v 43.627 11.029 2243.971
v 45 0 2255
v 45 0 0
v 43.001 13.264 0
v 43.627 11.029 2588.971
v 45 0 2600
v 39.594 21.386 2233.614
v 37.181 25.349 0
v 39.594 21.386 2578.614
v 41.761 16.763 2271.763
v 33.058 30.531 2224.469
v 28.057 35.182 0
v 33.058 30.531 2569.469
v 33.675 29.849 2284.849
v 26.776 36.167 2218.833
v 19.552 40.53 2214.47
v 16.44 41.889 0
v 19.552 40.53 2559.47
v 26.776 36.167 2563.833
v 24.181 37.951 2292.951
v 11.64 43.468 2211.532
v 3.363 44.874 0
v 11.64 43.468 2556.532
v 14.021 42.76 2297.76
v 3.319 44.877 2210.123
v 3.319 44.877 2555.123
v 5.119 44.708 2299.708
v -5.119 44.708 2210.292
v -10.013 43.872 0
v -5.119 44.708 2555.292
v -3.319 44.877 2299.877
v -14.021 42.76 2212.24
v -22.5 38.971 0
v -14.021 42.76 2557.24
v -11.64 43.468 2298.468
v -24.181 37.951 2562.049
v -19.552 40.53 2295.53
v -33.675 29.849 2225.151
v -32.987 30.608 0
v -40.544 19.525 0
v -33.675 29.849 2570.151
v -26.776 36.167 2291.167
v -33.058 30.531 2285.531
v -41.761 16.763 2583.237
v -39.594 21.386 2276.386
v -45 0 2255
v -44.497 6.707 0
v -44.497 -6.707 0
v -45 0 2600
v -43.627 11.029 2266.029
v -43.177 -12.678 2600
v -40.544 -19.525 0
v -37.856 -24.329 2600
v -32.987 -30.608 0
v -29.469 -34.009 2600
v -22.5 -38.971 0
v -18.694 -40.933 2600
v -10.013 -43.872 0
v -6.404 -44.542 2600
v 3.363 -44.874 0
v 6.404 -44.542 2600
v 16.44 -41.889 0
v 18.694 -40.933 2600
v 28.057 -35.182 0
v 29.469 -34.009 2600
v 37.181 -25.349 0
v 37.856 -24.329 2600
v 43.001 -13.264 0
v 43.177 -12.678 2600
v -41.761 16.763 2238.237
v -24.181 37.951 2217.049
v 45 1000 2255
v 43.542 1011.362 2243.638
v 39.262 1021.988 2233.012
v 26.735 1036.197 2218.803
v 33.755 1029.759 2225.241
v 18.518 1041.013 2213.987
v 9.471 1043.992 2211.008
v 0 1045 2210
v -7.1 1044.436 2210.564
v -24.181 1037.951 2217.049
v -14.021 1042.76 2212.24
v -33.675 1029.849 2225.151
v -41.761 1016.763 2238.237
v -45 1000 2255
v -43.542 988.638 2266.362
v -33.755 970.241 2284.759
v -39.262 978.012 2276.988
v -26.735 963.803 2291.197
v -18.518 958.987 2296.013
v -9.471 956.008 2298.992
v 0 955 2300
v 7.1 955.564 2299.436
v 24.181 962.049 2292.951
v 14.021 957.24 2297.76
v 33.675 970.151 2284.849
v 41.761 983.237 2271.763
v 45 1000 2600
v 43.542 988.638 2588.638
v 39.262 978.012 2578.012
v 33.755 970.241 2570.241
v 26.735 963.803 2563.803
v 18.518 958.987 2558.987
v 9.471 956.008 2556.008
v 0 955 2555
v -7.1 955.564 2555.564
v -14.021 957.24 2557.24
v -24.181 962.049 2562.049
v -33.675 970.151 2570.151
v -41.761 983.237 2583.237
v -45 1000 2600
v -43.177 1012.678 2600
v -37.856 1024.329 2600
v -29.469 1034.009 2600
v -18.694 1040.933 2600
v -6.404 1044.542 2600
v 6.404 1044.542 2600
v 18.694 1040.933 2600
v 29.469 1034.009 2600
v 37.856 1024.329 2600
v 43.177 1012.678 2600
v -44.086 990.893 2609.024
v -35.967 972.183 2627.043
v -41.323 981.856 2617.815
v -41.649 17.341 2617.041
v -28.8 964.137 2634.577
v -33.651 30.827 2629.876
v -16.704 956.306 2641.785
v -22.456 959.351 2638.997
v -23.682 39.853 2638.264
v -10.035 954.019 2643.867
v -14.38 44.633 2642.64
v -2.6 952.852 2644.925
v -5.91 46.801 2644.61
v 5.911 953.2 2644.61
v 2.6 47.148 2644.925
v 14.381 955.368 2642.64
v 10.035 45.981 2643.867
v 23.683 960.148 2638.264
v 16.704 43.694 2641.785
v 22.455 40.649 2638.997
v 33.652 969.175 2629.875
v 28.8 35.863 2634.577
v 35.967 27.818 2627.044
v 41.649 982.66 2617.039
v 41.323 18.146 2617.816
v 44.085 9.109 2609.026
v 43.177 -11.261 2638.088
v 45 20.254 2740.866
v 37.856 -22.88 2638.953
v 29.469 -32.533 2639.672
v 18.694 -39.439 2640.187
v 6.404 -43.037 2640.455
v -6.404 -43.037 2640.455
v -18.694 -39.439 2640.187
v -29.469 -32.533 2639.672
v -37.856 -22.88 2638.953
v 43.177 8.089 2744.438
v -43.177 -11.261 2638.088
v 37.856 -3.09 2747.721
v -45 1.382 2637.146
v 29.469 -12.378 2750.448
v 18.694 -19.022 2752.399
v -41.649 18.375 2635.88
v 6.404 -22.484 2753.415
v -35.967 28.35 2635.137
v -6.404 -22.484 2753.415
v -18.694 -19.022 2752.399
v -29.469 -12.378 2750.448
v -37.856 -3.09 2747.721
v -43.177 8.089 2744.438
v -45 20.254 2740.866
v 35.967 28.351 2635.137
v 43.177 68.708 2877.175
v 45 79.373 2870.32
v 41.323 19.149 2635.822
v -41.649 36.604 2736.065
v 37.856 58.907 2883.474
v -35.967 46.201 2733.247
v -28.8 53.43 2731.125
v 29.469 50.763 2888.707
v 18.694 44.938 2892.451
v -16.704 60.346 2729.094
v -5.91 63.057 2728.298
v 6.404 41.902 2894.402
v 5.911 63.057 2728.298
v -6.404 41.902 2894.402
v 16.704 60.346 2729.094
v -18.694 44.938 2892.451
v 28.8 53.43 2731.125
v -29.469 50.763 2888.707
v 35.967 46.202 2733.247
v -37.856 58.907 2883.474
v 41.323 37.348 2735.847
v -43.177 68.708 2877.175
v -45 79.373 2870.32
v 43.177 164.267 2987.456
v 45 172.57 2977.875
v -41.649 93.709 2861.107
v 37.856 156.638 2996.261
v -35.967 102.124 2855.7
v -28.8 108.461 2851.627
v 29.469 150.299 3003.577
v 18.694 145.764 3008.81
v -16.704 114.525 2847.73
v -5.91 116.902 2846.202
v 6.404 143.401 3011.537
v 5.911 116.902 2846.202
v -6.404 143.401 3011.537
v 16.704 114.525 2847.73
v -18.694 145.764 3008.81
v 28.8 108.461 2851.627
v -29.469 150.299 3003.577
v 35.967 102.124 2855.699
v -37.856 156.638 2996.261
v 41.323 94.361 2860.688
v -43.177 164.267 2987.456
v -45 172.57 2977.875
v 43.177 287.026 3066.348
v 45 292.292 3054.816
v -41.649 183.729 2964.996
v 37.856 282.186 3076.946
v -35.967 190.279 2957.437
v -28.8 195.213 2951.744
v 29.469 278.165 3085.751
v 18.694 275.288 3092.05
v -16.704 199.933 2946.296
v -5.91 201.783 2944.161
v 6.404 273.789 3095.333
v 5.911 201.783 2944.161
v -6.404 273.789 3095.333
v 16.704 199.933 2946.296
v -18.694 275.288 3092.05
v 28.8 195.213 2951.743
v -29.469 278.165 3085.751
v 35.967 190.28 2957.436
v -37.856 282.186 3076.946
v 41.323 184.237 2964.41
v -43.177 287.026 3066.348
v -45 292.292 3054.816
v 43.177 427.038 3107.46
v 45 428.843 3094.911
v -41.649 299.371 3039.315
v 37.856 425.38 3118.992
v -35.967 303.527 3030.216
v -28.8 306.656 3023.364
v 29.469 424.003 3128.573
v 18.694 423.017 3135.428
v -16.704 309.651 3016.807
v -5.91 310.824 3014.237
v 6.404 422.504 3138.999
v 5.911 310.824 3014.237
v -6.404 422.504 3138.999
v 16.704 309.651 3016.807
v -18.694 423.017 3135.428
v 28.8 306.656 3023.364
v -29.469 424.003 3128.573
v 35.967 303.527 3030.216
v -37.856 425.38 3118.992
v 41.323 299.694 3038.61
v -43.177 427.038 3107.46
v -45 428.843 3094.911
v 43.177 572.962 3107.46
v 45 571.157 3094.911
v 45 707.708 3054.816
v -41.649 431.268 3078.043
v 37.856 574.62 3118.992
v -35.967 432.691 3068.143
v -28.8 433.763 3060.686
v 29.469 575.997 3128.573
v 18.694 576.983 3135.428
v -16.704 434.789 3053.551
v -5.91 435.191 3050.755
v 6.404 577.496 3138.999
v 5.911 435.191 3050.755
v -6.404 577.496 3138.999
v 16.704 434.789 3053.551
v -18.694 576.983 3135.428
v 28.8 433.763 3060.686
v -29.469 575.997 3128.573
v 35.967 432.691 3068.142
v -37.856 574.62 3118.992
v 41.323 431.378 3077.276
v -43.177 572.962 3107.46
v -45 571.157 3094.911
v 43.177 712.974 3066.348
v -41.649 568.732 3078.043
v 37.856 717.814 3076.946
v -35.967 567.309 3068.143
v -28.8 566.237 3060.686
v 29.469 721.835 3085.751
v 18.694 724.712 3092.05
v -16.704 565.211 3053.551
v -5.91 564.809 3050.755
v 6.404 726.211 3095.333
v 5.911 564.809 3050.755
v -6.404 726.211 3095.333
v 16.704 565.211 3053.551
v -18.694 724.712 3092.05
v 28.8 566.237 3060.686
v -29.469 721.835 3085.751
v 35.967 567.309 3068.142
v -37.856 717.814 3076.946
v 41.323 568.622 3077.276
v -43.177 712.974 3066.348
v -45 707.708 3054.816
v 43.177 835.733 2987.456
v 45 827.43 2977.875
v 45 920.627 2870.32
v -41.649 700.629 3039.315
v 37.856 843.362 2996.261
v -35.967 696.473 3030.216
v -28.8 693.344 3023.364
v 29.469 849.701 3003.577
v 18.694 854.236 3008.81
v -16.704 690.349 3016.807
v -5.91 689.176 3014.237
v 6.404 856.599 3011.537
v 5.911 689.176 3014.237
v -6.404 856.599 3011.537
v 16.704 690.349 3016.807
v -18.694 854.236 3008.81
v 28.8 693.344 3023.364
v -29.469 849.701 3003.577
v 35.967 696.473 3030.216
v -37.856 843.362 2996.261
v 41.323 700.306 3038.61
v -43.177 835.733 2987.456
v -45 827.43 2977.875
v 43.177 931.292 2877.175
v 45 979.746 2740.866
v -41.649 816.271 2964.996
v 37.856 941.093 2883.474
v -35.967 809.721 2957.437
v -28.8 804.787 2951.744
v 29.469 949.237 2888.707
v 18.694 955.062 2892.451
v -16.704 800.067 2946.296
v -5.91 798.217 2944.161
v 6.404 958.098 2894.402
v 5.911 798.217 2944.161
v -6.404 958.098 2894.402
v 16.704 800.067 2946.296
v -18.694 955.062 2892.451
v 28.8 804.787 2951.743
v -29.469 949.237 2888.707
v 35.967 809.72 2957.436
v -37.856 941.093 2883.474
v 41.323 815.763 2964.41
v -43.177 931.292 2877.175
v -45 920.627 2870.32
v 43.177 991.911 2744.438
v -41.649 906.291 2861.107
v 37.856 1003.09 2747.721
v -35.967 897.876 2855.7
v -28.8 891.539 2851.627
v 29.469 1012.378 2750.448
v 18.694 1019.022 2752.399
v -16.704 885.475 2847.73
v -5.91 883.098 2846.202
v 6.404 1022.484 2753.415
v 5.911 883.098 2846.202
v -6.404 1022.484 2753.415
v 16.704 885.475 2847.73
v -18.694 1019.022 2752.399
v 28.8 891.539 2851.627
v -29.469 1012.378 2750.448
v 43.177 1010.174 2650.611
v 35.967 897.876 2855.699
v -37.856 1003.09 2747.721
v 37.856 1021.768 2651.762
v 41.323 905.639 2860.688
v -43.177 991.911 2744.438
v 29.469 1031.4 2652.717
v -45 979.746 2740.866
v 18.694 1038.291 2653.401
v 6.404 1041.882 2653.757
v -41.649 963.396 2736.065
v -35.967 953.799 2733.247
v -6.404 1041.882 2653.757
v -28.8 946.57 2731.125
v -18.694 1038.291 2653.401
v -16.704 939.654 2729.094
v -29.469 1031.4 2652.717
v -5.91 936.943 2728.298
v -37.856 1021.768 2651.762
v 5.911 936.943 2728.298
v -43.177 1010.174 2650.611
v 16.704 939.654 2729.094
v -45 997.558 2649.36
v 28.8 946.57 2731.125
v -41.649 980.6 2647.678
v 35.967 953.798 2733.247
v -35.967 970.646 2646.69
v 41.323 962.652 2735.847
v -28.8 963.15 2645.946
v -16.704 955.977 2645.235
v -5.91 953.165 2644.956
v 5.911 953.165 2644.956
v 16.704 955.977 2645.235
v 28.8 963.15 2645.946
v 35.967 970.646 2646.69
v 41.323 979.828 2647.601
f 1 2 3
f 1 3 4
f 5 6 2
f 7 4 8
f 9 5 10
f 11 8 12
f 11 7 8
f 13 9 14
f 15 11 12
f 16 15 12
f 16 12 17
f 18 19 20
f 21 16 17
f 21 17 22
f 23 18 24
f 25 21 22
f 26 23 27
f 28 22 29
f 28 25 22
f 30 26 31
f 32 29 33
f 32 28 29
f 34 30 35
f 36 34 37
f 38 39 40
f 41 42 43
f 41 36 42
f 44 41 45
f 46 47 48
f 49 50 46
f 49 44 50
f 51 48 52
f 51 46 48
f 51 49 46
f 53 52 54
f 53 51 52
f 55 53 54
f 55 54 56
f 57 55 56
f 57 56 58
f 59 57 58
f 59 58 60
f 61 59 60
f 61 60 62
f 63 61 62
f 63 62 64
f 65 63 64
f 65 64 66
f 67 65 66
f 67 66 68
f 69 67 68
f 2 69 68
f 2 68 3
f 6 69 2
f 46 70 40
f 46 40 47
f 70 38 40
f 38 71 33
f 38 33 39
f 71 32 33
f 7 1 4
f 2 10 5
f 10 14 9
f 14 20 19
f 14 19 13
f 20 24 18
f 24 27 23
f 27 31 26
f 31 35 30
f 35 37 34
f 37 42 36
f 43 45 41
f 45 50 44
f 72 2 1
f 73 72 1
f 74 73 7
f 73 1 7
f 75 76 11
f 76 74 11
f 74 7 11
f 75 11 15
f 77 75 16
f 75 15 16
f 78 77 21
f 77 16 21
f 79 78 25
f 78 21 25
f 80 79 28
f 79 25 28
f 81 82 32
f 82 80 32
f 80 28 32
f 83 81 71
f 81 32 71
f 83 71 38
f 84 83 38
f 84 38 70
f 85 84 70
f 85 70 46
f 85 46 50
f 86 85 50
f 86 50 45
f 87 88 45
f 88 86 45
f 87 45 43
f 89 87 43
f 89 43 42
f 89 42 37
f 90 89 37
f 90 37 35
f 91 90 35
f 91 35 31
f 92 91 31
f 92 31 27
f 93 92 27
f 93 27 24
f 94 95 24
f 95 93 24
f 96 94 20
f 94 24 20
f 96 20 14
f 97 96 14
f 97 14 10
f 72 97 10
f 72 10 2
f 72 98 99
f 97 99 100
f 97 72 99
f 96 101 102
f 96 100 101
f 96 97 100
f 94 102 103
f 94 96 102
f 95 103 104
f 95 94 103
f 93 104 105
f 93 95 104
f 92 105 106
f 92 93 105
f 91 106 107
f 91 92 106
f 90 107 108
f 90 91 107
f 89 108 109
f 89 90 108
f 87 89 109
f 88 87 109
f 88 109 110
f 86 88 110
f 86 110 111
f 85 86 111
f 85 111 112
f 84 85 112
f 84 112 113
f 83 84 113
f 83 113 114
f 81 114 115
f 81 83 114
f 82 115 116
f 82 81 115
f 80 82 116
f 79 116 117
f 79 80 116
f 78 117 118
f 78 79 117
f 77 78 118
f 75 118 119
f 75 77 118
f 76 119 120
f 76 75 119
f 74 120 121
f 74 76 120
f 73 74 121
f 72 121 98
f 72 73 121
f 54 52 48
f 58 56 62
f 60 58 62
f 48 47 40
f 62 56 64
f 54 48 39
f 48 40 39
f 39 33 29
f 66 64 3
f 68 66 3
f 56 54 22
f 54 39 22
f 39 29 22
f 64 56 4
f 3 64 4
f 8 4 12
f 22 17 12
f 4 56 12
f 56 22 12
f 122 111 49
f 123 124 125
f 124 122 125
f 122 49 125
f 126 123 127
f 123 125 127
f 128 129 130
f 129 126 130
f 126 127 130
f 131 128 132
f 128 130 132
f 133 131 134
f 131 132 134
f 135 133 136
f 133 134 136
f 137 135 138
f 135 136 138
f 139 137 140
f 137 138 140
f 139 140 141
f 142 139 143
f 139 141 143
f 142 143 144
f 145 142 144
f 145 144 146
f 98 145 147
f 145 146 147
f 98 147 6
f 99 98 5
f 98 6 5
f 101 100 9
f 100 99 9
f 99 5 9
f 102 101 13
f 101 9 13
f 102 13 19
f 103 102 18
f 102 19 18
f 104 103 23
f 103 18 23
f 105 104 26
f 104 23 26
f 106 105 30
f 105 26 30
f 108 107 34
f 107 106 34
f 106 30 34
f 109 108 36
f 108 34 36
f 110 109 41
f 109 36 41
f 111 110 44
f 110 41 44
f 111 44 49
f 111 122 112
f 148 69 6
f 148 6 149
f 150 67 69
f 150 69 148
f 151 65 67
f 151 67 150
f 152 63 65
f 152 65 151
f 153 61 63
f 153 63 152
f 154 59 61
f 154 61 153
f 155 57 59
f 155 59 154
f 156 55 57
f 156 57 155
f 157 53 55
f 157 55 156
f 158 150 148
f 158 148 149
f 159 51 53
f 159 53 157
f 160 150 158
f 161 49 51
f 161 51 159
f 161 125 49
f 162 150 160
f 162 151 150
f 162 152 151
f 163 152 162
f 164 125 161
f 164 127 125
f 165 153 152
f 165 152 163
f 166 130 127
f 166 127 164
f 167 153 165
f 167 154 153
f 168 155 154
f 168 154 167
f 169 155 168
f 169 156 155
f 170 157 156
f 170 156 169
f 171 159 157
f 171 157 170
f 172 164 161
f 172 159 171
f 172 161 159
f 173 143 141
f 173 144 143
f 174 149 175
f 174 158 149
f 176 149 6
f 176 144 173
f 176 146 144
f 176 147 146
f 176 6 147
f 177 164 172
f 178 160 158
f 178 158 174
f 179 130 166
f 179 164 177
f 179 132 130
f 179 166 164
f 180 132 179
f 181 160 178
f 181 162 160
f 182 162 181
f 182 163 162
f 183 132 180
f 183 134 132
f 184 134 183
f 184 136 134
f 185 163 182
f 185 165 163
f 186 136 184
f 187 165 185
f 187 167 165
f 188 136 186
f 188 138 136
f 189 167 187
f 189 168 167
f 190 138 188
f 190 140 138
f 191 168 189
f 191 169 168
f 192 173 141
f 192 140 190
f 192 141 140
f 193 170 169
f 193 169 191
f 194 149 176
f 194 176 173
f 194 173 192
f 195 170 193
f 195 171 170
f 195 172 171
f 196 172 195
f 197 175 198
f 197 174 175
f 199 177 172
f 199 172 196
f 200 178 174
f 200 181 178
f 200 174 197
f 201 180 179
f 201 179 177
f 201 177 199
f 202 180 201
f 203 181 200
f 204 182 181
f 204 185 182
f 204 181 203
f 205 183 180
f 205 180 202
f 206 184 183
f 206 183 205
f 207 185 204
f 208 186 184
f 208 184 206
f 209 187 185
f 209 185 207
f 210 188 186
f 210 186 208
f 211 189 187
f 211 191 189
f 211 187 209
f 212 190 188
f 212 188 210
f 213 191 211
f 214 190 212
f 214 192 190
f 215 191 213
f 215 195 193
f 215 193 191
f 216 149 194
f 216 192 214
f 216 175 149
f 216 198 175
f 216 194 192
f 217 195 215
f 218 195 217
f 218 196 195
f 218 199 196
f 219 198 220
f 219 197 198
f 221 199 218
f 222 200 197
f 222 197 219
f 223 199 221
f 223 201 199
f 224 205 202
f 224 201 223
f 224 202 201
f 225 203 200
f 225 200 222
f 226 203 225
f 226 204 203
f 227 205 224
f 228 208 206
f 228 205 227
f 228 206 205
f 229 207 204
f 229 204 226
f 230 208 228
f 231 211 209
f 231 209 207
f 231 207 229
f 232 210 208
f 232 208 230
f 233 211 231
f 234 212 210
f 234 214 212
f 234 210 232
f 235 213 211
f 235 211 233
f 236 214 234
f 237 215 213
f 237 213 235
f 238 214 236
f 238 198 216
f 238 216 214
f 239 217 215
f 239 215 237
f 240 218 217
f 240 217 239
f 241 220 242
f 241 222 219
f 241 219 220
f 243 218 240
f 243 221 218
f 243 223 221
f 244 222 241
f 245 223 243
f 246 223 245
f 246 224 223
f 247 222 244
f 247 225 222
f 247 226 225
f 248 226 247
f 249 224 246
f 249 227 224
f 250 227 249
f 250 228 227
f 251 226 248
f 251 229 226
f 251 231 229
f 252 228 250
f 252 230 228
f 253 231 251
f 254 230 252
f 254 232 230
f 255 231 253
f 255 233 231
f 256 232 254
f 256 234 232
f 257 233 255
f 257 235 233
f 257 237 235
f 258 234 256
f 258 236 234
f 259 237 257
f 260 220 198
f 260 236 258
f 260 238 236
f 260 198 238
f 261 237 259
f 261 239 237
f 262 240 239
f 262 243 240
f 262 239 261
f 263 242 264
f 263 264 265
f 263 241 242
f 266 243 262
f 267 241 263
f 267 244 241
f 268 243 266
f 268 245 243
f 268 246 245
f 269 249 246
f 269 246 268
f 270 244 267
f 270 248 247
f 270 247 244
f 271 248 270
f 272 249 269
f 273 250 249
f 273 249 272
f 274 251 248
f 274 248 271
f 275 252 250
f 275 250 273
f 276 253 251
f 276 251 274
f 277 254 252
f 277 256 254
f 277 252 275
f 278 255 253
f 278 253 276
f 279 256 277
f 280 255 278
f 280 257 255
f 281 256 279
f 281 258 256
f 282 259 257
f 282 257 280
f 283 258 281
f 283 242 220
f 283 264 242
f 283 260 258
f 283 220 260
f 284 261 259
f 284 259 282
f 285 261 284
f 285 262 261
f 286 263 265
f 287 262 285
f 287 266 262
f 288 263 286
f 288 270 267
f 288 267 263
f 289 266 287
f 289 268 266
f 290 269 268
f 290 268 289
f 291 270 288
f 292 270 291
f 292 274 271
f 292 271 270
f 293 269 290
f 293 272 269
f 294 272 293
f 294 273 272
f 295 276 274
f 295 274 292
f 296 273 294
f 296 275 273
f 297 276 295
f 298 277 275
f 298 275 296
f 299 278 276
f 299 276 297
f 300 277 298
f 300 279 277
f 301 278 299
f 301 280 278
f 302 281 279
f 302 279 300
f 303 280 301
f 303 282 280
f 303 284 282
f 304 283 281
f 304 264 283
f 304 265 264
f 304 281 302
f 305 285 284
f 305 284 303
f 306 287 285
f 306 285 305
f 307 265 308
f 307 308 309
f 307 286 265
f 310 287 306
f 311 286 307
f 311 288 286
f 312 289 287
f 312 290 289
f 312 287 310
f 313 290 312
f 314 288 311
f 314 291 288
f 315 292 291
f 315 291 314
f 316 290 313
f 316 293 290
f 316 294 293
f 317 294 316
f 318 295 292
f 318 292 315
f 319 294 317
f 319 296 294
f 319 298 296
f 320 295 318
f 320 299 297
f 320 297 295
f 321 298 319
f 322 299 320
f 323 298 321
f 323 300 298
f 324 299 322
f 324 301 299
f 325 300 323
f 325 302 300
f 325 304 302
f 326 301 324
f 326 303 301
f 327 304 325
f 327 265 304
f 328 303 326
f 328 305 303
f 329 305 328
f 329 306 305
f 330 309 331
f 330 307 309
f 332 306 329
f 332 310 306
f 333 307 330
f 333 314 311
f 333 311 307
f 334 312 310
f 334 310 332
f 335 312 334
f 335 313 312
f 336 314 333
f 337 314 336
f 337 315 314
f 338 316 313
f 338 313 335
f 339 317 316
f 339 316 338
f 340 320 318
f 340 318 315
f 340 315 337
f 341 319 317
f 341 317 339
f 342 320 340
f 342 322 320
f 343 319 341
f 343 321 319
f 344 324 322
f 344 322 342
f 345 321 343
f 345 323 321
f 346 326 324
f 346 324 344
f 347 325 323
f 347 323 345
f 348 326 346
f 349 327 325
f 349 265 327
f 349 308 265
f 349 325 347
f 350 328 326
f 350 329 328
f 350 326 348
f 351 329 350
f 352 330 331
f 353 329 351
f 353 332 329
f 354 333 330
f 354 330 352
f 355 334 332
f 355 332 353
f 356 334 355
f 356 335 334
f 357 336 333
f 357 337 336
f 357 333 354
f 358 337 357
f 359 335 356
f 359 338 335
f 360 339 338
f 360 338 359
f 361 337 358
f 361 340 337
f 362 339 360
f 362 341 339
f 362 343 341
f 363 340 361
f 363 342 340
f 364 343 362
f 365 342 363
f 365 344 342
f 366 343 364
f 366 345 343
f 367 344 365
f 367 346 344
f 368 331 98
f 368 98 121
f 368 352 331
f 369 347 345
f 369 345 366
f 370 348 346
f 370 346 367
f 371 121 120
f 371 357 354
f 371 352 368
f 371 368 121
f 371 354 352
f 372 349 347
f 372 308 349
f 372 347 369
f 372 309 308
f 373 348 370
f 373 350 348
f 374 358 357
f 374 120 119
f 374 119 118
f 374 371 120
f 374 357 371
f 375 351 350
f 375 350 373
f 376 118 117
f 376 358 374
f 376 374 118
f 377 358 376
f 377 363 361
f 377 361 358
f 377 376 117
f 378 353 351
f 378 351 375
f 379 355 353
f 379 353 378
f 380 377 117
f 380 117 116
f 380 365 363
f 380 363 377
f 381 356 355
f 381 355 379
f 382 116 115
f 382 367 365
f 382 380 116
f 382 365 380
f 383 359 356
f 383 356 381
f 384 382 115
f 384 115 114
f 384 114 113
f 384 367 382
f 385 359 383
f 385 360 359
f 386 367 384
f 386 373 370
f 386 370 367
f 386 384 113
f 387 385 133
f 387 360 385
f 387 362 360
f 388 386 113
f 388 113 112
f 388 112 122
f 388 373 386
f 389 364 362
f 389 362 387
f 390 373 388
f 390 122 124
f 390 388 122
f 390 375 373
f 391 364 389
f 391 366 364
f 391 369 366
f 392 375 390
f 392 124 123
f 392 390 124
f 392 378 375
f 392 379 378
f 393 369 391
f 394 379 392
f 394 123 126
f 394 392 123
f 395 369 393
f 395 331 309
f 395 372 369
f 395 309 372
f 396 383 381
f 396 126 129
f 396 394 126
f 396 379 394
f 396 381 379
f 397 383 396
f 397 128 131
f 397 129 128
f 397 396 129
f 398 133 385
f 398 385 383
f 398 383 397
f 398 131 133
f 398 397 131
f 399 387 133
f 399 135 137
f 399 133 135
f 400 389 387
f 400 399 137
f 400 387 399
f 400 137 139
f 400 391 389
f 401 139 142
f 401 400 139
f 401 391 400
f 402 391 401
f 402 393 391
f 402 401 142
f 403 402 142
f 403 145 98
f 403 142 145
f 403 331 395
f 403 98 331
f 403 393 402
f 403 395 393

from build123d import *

# Parameters (mm, degrees)
SWEEP1_PROFILE_R        = 45
CUT_EXTRUDE1_DEPTH      = 3315.373998336
CUT_EXTRUDE1_DEPTH_BACK = 3315.373998336
BOSS_EXTRUDE1_REACH     = 3316.374
SKETCH8_R               = 45


with BuildPart() as part:
    # Sweep1: sweep along a path in Sketch1
    with BuildLine(Plane.YZ) as sweep1_path:
        Line((0, 0), (0, 2600))
        ThreePointArc((0, 2600), (500, 3100), (1000, 2600))
        Line((1000, 2600), (1000, 2210))
    # Sweep1 profile (on start of the path) → Sweep1 (sweep)
    with BuildSketch(Plane.XY):
        Circle(SWEEP1_PROFILE_R)
    sweep(path=sweep1_path.line)

    # Sketch9 → Cut-Extrude1 (cut, two sides: drawn at the far end of the back side and taken through both)
    with BuildSketch(Plane.YZ.offset(-CUT_EXTRUDE1_DEPTH_BACK)):
        Polygon((1045, 2210), (955, 2300), (955, 2210), align=None)
    extrude(amount=CUT_EXTRUDE1_DEPTH + CUT_EXTRUDE1_DEPTH_BACK, mode=Mode.SUBTRACT)

    # Sketch8 → Boss-Extrude1 (add, up to next)
    with BuildSketch(Plane(origin=(0, 0, 0), x_dir=(-1, 0, 0), z_dir=(0, 1, 0)), mode=Mode.PRIVATE) as boss_extrude1_sk1:
        with Locations((0, 2600)):
            Circle(SKETCH8_R)
    boss_extrude1_tool1 = extrude(boss_extrude1_sk1.sketch, amount=BOSS_EXTRUDE1_REACH, mode=Mode.PRIVATE) - part.part
    # Sketch8 → Boss-Extrude1 (add, up to next)
    with BuildSketch(Plane(origin=(0, 0, 0), x_dir=(-1, 0, 0), z_dir=(0, 1, 0)), mode=Mode.PRIVATE) as boss_extrude1_sk2:
        with Locations(Location((0, 2255, 0), (0, 0, 180))):
            Circle(SKETCH8_R)
    boss_extrude1_tool2 = extrude(boss_extrude1_sk2.sketch, amount=BOSS_EXTRUDE1_REACH, mode=Mode.PRIVATE) - part.part
    add(boss_extrude1_tool1.solids().sort_by_distance((0, 0, 2600))[0])
    add(boss_extrude1_tool2.solids().sort_by_distance((0, 0, 2255))[0])


solid = part.part
